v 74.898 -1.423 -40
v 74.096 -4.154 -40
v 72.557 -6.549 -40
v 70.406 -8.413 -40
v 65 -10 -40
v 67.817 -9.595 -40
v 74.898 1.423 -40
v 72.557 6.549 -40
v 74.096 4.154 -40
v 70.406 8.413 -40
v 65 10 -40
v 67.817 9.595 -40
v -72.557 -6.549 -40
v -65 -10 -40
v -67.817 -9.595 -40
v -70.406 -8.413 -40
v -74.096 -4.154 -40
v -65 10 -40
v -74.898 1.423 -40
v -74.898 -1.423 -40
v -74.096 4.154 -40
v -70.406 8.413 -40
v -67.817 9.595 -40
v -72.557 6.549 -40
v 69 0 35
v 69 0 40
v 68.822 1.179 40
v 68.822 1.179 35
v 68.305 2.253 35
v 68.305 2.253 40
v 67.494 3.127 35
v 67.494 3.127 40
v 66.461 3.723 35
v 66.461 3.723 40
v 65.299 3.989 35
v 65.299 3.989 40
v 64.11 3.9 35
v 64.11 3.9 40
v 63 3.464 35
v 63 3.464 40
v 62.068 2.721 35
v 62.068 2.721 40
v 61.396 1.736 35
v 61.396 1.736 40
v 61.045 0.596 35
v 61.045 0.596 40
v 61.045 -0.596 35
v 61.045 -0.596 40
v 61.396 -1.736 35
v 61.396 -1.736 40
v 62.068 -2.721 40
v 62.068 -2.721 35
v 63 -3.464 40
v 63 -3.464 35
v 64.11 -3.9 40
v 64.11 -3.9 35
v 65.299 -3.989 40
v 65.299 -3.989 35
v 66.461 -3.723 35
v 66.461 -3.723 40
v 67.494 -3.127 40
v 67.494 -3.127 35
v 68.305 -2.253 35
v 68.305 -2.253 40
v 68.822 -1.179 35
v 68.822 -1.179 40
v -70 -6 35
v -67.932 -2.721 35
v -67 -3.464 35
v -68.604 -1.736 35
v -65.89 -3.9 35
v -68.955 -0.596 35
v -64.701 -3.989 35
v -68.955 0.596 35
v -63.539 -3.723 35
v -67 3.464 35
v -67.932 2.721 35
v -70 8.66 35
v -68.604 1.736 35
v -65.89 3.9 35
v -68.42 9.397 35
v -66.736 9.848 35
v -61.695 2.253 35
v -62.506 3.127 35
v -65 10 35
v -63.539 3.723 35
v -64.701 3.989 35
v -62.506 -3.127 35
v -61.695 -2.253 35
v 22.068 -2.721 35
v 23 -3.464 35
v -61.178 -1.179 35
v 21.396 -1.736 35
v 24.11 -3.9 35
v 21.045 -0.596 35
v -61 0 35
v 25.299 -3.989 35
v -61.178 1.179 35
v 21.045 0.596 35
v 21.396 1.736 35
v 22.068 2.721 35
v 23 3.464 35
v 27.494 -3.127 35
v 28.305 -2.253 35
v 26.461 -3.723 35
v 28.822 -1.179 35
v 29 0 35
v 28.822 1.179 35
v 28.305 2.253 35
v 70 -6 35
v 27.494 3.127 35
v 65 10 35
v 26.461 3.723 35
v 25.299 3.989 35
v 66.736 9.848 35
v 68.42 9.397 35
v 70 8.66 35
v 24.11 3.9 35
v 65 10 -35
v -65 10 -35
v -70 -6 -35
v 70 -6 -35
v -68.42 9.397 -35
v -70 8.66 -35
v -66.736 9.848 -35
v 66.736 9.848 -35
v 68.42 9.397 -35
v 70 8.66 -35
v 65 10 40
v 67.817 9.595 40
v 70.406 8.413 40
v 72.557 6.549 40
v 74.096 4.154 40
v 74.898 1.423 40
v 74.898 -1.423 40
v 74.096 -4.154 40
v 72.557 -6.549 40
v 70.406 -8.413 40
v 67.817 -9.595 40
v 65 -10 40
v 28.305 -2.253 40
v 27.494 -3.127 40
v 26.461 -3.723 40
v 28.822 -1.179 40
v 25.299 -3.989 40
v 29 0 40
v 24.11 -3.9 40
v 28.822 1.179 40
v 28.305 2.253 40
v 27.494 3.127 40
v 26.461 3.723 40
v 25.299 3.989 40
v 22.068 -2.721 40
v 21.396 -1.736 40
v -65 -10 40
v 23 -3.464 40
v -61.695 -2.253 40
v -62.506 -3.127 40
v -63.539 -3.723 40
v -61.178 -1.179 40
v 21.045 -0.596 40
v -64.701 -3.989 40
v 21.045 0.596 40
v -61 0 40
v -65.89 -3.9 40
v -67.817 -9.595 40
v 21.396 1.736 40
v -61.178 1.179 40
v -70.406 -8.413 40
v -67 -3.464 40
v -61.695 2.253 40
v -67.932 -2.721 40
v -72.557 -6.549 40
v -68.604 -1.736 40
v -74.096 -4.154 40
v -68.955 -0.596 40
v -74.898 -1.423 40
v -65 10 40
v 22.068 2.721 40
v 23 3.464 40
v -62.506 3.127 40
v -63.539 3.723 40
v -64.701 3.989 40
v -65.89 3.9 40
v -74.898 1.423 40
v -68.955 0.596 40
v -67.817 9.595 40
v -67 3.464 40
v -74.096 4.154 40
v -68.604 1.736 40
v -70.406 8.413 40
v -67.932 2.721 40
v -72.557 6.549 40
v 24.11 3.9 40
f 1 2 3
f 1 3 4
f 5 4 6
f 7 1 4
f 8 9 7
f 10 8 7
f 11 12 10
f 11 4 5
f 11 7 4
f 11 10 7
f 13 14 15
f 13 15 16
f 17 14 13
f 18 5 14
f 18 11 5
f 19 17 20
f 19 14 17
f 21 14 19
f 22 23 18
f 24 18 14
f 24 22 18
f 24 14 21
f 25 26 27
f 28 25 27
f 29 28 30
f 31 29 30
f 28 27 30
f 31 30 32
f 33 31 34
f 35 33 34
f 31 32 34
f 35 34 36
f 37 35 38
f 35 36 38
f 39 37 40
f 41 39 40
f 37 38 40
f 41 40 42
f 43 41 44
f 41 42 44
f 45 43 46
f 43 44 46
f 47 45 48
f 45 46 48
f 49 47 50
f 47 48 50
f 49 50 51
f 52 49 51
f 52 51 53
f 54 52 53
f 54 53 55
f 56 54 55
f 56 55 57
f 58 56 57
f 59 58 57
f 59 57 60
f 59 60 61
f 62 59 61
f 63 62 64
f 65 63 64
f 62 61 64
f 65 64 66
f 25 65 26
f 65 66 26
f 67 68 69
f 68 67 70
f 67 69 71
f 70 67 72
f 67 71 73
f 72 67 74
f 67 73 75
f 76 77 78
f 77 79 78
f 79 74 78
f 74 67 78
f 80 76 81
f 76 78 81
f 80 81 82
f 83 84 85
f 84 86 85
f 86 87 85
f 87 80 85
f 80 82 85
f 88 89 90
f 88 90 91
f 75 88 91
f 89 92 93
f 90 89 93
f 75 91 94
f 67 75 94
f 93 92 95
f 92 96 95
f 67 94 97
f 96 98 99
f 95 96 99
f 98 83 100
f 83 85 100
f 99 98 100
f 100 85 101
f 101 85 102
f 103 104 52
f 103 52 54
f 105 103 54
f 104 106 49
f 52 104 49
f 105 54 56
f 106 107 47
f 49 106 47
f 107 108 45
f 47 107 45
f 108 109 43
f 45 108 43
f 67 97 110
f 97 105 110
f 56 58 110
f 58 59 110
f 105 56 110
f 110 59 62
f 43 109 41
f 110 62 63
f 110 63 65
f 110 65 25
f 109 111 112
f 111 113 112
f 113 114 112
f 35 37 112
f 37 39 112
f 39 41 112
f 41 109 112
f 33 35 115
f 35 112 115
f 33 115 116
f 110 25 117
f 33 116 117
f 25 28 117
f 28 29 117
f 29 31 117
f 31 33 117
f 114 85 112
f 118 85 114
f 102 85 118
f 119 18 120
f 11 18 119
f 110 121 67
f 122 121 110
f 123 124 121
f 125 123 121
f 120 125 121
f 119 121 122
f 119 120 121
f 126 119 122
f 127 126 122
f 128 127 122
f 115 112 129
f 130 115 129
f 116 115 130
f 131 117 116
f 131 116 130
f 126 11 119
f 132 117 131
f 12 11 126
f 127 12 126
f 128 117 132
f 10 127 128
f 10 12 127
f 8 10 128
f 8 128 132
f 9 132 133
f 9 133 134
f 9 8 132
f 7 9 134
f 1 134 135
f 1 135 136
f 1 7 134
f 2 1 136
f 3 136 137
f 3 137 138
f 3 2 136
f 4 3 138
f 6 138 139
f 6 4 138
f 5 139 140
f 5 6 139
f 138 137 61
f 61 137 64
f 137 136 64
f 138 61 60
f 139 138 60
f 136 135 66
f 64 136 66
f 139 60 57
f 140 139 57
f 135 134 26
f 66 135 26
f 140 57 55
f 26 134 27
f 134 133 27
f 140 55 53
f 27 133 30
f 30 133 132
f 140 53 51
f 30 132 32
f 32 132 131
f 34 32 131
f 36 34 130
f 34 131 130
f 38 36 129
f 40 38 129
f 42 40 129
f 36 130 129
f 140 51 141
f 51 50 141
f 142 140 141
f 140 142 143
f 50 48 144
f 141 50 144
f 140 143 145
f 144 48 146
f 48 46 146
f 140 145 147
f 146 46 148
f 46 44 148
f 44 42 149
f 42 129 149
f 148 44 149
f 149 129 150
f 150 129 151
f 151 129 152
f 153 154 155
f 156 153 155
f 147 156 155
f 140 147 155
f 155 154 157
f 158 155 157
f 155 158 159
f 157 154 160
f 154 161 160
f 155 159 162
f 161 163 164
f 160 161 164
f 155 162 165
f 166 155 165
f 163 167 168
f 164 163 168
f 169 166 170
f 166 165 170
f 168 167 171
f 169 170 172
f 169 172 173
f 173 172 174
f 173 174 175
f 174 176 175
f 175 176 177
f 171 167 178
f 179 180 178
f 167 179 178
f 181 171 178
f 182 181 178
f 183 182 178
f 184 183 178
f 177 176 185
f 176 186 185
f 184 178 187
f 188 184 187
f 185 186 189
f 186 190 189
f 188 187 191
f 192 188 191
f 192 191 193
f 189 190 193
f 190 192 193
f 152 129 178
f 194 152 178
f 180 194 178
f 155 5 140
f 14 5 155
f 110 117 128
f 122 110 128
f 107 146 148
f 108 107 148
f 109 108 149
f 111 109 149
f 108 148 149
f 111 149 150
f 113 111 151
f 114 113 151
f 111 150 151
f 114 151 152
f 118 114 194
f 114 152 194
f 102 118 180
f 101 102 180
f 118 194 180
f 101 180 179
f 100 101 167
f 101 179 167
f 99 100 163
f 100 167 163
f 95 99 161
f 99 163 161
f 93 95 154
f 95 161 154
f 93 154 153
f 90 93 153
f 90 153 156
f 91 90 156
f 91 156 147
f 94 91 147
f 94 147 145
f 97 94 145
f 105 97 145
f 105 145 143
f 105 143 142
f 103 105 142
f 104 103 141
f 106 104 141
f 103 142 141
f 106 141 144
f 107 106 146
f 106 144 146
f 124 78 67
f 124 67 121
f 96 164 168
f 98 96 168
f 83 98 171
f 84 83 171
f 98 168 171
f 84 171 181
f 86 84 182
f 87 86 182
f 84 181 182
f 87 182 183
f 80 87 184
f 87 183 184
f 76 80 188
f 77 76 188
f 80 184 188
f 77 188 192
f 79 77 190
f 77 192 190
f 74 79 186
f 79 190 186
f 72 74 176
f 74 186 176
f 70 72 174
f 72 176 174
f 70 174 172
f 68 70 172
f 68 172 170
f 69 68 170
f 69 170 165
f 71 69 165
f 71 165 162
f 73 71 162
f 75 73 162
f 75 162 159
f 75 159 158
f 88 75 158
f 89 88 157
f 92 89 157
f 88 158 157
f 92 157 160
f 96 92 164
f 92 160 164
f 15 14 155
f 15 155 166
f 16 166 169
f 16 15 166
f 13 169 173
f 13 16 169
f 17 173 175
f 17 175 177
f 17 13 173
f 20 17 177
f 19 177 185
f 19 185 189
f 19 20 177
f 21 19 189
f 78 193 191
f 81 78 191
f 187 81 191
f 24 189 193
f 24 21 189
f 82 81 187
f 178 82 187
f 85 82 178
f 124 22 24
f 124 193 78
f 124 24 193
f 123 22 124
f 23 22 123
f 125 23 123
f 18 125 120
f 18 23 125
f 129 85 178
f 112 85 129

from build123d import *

# Parameters (mm, degrees)
BOSS_EXTRUDE1_DEPTH      = 40
BOSS_EXTRUDE1_DEPTH_BACK = 40
SKETCH2_W                = 140
SKETCH2_H                = 70
CUT_EXTRUDE1_DEPTH       = 16
SKETCH3_R                = 4
CUT_EXTRUDE2_DEPTH       = 5


with BuildPart() as part:
    # Sketch1 → Boss-Extrude1 (new, two sides: drawn at the far end of the back side and taken through both)
    with BuildSketch(Plane.XY.offset(-BOSS_EXTRUDE1_DEPTH_BACK)):
        with BuildLine():
            Line((-65, 10), (65, 10))
            ThreePointArc((65, 10), (75, 0), (65, -10))
            Line((65, -10), (-65, -10))
            ThreePointArc((-65, -10), (-75, 0), (-65, 10))
        make_face()
    extrude(amount=BOSS_EXTRUDE1_DEPTH + BOSS_EXTRUDE1_DEPTH_BACK)

    # Sketch2 → Cut-Extrude1 (cut)
    with BuildSketch(Plane(origin=(0, 10, 0), x_dir=(1, 0, 0), z_dir=(0, 1, 0))):
        Rectangle(SKETCH2_W, SKETCH2_H)
    extrude(amount=-CUT_EXTRUDE1_DEPTH, mode=Mode.SUBTRACT)

    # Sketch3 → Cut-Extrude2 (cut)
    with BuildSketch(Plane.XY.offset(40)):
        with Locations((65, 0)):
            Circle(SKETCH3_R)
        with Locations((-65, 0)):
            Circle(SKETCH3_R)
        with Locations((25, 0)):
            Circle(SKETCH3_R)
    extrude(amount=-CUT_EXTRUDE2_DEPTH, mode=Mode.SUBTRACT)


solid = part.part
